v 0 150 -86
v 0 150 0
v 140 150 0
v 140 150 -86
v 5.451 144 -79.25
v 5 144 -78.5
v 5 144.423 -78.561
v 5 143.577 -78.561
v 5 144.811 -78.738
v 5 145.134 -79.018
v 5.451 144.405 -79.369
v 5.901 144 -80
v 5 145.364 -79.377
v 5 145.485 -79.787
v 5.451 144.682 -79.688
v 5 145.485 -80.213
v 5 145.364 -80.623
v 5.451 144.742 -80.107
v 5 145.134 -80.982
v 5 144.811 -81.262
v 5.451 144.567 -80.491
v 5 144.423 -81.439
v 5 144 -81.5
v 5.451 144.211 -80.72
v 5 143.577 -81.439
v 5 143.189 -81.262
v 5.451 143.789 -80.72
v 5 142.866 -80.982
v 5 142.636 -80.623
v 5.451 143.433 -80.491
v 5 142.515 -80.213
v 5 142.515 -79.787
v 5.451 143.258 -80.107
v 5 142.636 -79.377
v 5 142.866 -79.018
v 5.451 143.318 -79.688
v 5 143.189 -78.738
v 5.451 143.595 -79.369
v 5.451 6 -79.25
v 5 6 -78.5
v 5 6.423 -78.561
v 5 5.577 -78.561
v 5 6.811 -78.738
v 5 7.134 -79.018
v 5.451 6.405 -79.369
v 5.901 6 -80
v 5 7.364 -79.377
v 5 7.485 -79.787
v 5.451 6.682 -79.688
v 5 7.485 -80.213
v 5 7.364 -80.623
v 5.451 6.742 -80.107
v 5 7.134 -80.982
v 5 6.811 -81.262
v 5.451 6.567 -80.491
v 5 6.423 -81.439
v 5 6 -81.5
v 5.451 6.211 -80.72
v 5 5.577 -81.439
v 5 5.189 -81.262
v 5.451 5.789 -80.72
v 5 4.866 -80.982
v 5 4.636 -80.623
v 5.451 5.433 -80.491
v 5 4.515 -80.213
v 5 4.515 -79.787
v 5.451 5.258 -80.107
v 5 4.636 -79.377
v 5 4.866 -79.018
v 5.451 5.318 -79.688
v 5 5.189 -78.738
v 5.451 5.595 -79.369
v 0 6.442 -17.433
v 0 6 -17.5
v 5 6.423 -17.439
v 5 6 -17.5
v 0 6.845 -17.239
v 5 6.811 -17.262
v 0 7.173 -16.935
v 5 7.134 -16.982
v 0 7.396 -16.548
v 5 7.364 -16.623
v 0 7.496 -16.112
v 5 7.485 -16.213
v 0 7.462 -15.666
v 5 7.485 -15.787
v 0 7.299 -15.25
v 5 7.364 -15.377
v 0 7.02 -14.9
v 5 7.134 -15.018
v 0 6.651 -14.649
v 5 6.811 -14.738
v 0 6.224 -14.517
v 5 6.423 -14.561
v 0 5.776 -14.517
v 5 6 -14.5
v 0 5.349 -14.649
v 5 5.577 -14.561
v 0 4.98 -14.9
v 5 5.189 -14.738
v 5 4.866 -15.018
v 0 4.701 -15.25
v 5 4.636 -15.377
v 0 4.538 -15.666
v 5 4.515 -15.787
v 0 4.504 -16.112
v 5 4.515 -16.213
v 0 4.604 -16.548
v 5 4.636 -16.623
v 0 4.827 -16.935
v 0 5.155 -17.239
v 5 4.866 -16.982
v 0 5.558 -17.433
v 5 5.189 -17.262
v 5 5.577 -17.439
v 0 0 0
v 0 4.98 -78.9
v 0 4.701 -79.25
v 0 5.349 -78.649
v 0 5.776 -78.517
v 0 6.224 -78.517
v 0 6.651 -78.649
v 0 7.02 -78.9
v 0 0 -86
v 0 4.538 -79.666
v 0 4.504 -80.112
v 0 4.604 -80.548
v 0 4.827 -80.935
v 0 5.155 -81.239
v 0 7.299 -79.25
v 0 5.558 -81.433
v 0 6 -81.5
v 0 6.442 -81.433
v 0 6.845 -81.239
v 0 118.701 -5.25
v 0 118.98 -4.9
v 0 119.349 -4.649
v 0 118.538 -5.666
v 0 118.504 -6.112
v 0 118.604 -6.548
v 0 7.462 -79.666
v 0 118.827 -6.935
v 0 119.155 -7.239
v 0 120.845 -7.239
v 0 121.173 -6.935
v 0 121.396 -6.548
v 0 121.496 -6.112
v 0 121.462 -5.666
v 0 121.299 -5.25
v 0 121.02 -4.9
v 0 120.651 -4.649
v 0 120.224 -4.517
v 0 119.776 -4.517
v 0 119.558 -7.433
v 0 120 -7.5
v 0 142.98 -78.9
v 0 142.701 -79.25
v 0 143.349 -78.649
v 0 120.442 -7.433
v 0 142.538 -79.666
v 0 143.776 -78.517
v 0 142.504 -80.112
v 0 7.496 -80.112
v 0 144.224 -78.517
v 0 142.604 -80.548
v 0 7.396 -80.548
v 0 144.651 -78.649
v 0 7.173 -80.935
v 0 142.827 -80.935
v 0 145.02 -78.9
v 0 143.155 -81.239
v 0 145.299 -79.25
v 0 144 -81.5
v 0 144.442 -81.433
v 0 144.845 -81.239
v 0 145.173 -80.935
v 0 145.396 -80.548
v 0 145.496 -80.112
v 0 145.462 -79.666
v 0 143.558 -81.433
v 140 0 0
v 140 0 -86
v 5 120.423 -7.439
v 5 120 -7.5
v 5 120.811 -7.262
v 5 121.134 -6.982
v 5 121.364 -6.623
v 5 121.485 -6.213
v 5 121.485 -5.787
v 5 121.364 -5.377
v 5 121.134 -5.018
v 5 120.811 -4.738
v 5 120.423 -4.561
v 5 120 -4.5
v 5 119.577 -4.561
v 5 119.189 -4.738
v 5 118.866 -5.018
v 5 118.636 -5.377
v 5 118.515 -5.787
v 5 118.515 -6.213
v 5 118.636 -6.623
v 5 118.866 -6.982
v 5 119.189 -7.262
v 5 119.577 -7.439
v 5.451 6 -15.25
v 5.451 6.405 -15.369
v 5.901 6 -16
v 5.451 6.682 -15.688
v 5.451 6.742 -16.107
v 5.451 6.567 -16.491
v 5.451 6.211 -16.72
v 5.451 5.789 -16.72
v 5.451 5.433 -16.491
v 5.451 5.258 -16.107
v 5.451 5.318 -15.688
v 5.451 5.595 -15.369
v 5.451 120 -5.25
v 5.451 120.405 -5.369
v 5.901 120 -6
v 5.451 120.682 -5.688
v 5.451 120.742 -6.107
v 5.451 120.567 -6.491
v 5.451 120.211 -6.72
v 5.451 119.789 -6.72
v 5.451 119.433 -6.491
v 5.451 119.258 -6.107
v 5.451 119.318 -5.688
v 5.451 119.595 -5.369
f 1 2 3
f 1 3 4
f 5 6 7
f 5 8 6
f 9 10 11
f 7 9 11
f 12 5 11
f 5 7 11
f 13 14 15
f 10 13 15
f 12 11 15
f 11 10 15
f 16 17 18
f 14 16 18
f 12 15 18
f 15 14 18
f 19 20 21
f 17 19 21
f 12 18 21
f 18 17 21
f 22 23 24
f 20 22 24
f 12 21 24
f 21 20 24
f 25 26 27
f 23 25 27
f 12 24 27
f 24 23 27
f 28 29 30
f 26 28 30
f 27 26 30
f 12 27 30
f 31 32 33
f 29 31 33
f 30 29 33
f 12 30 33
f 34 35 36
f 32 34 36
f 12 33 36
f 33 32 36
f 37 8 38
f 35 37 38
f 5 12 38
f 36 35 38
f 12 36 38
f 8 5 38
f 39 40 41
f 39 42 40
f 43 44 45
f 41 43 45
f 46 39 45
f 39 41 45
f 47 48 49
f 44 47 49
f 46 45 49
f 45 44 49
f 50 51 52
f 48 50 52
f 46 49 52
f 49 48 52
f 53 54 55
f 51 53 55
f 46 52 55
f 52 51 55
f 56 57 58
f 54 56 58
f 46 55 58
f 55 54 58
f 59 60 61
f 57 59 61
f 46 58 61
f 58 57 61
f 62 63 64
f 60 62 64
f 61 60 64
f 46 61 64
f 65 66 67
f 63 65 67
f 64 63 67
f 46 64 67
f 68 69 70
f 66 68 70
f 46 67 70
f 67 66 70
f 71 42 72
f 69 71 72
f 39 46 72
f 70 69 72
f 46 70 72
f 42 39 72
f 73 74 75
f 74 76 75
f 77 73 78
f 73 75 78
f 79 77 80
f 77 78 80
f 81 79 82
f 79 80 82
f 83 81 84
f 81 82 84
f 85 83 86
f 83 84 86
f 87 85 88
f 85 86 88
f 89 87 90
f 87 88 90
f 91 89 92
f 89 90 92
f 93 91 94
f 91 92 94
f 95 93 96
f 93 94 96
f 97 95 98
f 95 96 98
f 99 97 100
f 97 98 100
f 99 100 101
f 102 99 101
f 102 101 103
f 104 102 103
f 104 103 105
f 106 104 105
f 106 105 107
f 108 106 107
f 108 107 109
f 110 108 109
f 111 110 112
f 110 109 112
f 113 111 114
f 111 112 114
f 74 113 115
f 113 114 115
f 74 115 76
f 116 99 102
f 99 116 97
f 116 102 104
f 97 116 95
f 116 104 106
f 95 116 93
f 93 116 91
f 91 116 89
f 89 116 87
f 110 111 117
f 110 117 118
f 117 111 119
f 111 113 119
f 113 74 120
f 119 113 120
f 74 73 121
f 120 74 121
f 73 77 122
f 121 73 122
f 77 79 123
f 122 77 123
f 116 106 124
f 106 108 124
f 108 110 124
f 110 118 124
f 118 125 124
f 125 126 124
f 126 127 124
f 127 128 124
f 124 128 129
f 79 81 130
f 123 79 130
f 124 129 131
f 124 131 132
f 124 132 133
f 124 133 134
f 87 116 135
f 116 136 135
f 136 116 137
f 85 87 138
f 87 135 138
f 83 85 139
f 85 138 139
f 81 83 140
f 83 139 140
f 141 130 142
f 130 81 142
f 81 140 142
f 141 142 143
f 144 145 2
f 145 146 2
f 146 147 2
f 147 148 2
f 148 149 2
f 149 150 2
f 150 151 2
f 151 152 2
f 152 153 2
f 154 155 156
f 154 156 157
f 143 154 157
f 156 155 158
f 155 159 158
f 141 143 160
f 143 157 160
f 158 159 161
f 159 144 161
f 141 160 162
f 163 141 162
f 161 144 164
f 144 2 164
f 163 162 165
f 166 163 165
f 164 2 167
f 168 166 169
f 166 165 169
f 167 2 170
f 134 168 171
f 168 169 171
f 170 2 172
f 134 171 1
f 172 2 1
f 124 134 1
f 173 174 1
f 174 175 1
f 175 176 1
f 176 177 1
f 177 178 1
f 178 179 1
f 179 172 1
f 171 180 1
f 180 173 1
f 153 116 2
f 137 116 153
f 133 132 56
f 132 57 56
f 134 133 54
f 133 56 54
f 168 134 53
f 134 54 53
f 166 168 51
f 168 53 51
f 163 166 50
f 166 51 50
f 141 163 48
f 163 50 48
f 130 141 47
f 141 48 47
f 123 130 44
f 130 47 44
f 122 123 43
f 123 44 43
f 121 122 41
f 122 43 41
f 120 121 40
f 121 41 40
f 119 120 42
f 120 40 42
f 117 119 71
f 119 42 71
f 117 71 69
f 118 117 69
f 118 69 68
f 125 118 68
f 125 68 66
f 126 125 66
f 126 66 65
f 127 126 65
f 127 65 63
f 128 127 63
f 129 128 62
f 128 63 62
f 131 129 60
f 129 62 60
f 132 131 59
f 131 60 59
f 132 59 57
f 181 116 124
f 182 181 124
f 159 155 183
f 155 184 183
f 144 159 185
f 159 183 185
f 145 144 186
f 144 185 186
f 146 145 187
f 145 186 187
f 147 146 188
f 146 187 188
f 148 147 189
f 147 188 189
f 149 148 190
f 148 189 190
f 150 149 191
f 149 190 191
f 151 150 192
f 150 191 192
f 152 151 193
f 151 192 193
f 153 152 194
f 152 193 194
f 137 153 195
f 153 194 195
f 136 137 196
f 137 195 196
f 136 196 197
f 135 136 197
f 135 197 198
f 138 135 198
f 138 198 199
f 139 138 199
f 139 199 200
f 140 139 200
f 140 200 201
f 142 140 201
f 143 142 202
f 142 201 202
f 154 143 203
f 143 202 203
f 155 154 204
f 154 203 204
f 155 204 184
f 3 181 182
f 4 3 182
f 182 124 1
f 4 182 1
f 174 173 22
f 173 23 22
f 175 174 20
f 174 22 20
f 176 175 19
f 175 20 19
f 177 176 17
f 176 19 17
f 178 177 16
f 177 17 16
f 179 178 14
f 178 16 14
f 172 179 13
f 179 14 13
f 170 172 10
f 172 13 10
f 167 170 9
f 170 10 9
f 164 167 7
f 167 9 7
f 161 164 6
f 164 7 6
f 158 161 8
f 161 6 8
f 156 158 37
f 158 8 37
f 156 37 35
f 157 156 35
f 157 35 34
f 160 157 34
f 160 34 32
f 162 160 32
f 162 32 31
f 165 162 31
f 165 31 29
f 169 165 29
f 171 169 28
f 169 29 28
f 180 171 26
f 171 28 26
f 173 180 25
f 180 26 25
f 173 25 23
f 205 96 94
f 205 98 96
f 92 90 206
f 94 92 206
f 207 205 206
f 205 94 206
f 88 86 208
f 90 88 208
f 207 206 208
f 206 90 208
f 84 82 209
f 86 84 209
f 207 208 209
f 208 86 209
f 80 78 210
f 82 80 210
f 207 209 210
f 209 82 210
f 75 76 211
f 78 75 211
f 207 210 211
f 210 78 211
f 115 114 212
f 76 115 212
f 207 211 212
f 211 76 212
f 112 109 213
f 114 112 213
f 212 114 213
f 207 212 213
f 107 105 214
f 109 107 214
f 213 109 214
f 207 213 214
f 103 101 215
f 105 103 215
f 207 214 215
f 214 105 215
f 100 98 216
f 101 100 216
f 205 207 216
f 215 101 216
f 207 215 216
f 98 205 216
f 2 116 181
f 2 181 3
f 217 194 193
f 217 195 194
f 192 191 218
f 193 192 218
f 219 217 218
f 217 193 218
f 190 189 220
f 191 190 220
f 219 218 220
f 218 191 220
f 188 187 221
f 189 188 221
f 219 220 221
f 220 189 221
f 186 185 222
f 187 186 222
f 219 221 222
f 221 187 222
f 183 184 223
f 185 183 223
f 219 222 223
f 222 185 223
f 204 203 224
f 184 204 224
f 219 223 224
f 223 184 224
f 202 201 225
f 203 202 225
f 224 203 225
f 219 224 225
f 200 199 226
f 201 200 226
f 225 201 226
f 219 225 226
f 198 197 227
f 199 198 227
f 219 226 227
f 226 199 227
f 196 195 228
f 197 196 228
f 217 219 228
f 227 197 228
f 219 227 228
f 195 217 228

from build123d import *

# Parameters (mm, degrees)
SKETCH_1_W                = 86
SKETCH_1_H                = 150
EXTRUDE_1_DEPTH           = 140
HOLE_WIZARD_3_0_3_1_D     = 3
HOLE_WIZARD_3_0_3_1_DEPTH = 5
HOLE_WIZARD_3_0_3_1_TIP   = 0.901290929


with BuildPart() as part:
    # Эскиз1 → Бобышка-Вытянуть1 (new body)
    with BuildSketch(Plane(origin=(0, 0, 0), x_dir=(0, 0, -1), z_dir=(1, 0, 0))):
        with Locations((43, 75)):
            Rectangle(SKETCH_1_W, SKETCH_1_H)
    extrude(amount=EXTRUDE_1_DEPTH)

    # Диаметр отверстия Ø3.0 (3)1
    with Locations(Plane.ZY):
        with Locations((-80, 144), (-6, 120), (-16, 6), (-80, 6)):
            Hole(HOLE_WIZARD_3_0_3_1_D / 2, depth=HOLE_WIZARD_3_0_3_1_DEPTH)
            with Locations((0, 0, -(HOLE_WIZARD_3_0_3_1_DEPTH + HOLE_WIZARD_3_0_3_1_TIP / 2))):  # 118° drill point
                Cone(0, HOLE_WIZARD_3_0_3_1_D / 2, HOLE_WIZARD_3_0_3_1_TIP, mode=Mode.SUBTRACT)


solid = part.part
